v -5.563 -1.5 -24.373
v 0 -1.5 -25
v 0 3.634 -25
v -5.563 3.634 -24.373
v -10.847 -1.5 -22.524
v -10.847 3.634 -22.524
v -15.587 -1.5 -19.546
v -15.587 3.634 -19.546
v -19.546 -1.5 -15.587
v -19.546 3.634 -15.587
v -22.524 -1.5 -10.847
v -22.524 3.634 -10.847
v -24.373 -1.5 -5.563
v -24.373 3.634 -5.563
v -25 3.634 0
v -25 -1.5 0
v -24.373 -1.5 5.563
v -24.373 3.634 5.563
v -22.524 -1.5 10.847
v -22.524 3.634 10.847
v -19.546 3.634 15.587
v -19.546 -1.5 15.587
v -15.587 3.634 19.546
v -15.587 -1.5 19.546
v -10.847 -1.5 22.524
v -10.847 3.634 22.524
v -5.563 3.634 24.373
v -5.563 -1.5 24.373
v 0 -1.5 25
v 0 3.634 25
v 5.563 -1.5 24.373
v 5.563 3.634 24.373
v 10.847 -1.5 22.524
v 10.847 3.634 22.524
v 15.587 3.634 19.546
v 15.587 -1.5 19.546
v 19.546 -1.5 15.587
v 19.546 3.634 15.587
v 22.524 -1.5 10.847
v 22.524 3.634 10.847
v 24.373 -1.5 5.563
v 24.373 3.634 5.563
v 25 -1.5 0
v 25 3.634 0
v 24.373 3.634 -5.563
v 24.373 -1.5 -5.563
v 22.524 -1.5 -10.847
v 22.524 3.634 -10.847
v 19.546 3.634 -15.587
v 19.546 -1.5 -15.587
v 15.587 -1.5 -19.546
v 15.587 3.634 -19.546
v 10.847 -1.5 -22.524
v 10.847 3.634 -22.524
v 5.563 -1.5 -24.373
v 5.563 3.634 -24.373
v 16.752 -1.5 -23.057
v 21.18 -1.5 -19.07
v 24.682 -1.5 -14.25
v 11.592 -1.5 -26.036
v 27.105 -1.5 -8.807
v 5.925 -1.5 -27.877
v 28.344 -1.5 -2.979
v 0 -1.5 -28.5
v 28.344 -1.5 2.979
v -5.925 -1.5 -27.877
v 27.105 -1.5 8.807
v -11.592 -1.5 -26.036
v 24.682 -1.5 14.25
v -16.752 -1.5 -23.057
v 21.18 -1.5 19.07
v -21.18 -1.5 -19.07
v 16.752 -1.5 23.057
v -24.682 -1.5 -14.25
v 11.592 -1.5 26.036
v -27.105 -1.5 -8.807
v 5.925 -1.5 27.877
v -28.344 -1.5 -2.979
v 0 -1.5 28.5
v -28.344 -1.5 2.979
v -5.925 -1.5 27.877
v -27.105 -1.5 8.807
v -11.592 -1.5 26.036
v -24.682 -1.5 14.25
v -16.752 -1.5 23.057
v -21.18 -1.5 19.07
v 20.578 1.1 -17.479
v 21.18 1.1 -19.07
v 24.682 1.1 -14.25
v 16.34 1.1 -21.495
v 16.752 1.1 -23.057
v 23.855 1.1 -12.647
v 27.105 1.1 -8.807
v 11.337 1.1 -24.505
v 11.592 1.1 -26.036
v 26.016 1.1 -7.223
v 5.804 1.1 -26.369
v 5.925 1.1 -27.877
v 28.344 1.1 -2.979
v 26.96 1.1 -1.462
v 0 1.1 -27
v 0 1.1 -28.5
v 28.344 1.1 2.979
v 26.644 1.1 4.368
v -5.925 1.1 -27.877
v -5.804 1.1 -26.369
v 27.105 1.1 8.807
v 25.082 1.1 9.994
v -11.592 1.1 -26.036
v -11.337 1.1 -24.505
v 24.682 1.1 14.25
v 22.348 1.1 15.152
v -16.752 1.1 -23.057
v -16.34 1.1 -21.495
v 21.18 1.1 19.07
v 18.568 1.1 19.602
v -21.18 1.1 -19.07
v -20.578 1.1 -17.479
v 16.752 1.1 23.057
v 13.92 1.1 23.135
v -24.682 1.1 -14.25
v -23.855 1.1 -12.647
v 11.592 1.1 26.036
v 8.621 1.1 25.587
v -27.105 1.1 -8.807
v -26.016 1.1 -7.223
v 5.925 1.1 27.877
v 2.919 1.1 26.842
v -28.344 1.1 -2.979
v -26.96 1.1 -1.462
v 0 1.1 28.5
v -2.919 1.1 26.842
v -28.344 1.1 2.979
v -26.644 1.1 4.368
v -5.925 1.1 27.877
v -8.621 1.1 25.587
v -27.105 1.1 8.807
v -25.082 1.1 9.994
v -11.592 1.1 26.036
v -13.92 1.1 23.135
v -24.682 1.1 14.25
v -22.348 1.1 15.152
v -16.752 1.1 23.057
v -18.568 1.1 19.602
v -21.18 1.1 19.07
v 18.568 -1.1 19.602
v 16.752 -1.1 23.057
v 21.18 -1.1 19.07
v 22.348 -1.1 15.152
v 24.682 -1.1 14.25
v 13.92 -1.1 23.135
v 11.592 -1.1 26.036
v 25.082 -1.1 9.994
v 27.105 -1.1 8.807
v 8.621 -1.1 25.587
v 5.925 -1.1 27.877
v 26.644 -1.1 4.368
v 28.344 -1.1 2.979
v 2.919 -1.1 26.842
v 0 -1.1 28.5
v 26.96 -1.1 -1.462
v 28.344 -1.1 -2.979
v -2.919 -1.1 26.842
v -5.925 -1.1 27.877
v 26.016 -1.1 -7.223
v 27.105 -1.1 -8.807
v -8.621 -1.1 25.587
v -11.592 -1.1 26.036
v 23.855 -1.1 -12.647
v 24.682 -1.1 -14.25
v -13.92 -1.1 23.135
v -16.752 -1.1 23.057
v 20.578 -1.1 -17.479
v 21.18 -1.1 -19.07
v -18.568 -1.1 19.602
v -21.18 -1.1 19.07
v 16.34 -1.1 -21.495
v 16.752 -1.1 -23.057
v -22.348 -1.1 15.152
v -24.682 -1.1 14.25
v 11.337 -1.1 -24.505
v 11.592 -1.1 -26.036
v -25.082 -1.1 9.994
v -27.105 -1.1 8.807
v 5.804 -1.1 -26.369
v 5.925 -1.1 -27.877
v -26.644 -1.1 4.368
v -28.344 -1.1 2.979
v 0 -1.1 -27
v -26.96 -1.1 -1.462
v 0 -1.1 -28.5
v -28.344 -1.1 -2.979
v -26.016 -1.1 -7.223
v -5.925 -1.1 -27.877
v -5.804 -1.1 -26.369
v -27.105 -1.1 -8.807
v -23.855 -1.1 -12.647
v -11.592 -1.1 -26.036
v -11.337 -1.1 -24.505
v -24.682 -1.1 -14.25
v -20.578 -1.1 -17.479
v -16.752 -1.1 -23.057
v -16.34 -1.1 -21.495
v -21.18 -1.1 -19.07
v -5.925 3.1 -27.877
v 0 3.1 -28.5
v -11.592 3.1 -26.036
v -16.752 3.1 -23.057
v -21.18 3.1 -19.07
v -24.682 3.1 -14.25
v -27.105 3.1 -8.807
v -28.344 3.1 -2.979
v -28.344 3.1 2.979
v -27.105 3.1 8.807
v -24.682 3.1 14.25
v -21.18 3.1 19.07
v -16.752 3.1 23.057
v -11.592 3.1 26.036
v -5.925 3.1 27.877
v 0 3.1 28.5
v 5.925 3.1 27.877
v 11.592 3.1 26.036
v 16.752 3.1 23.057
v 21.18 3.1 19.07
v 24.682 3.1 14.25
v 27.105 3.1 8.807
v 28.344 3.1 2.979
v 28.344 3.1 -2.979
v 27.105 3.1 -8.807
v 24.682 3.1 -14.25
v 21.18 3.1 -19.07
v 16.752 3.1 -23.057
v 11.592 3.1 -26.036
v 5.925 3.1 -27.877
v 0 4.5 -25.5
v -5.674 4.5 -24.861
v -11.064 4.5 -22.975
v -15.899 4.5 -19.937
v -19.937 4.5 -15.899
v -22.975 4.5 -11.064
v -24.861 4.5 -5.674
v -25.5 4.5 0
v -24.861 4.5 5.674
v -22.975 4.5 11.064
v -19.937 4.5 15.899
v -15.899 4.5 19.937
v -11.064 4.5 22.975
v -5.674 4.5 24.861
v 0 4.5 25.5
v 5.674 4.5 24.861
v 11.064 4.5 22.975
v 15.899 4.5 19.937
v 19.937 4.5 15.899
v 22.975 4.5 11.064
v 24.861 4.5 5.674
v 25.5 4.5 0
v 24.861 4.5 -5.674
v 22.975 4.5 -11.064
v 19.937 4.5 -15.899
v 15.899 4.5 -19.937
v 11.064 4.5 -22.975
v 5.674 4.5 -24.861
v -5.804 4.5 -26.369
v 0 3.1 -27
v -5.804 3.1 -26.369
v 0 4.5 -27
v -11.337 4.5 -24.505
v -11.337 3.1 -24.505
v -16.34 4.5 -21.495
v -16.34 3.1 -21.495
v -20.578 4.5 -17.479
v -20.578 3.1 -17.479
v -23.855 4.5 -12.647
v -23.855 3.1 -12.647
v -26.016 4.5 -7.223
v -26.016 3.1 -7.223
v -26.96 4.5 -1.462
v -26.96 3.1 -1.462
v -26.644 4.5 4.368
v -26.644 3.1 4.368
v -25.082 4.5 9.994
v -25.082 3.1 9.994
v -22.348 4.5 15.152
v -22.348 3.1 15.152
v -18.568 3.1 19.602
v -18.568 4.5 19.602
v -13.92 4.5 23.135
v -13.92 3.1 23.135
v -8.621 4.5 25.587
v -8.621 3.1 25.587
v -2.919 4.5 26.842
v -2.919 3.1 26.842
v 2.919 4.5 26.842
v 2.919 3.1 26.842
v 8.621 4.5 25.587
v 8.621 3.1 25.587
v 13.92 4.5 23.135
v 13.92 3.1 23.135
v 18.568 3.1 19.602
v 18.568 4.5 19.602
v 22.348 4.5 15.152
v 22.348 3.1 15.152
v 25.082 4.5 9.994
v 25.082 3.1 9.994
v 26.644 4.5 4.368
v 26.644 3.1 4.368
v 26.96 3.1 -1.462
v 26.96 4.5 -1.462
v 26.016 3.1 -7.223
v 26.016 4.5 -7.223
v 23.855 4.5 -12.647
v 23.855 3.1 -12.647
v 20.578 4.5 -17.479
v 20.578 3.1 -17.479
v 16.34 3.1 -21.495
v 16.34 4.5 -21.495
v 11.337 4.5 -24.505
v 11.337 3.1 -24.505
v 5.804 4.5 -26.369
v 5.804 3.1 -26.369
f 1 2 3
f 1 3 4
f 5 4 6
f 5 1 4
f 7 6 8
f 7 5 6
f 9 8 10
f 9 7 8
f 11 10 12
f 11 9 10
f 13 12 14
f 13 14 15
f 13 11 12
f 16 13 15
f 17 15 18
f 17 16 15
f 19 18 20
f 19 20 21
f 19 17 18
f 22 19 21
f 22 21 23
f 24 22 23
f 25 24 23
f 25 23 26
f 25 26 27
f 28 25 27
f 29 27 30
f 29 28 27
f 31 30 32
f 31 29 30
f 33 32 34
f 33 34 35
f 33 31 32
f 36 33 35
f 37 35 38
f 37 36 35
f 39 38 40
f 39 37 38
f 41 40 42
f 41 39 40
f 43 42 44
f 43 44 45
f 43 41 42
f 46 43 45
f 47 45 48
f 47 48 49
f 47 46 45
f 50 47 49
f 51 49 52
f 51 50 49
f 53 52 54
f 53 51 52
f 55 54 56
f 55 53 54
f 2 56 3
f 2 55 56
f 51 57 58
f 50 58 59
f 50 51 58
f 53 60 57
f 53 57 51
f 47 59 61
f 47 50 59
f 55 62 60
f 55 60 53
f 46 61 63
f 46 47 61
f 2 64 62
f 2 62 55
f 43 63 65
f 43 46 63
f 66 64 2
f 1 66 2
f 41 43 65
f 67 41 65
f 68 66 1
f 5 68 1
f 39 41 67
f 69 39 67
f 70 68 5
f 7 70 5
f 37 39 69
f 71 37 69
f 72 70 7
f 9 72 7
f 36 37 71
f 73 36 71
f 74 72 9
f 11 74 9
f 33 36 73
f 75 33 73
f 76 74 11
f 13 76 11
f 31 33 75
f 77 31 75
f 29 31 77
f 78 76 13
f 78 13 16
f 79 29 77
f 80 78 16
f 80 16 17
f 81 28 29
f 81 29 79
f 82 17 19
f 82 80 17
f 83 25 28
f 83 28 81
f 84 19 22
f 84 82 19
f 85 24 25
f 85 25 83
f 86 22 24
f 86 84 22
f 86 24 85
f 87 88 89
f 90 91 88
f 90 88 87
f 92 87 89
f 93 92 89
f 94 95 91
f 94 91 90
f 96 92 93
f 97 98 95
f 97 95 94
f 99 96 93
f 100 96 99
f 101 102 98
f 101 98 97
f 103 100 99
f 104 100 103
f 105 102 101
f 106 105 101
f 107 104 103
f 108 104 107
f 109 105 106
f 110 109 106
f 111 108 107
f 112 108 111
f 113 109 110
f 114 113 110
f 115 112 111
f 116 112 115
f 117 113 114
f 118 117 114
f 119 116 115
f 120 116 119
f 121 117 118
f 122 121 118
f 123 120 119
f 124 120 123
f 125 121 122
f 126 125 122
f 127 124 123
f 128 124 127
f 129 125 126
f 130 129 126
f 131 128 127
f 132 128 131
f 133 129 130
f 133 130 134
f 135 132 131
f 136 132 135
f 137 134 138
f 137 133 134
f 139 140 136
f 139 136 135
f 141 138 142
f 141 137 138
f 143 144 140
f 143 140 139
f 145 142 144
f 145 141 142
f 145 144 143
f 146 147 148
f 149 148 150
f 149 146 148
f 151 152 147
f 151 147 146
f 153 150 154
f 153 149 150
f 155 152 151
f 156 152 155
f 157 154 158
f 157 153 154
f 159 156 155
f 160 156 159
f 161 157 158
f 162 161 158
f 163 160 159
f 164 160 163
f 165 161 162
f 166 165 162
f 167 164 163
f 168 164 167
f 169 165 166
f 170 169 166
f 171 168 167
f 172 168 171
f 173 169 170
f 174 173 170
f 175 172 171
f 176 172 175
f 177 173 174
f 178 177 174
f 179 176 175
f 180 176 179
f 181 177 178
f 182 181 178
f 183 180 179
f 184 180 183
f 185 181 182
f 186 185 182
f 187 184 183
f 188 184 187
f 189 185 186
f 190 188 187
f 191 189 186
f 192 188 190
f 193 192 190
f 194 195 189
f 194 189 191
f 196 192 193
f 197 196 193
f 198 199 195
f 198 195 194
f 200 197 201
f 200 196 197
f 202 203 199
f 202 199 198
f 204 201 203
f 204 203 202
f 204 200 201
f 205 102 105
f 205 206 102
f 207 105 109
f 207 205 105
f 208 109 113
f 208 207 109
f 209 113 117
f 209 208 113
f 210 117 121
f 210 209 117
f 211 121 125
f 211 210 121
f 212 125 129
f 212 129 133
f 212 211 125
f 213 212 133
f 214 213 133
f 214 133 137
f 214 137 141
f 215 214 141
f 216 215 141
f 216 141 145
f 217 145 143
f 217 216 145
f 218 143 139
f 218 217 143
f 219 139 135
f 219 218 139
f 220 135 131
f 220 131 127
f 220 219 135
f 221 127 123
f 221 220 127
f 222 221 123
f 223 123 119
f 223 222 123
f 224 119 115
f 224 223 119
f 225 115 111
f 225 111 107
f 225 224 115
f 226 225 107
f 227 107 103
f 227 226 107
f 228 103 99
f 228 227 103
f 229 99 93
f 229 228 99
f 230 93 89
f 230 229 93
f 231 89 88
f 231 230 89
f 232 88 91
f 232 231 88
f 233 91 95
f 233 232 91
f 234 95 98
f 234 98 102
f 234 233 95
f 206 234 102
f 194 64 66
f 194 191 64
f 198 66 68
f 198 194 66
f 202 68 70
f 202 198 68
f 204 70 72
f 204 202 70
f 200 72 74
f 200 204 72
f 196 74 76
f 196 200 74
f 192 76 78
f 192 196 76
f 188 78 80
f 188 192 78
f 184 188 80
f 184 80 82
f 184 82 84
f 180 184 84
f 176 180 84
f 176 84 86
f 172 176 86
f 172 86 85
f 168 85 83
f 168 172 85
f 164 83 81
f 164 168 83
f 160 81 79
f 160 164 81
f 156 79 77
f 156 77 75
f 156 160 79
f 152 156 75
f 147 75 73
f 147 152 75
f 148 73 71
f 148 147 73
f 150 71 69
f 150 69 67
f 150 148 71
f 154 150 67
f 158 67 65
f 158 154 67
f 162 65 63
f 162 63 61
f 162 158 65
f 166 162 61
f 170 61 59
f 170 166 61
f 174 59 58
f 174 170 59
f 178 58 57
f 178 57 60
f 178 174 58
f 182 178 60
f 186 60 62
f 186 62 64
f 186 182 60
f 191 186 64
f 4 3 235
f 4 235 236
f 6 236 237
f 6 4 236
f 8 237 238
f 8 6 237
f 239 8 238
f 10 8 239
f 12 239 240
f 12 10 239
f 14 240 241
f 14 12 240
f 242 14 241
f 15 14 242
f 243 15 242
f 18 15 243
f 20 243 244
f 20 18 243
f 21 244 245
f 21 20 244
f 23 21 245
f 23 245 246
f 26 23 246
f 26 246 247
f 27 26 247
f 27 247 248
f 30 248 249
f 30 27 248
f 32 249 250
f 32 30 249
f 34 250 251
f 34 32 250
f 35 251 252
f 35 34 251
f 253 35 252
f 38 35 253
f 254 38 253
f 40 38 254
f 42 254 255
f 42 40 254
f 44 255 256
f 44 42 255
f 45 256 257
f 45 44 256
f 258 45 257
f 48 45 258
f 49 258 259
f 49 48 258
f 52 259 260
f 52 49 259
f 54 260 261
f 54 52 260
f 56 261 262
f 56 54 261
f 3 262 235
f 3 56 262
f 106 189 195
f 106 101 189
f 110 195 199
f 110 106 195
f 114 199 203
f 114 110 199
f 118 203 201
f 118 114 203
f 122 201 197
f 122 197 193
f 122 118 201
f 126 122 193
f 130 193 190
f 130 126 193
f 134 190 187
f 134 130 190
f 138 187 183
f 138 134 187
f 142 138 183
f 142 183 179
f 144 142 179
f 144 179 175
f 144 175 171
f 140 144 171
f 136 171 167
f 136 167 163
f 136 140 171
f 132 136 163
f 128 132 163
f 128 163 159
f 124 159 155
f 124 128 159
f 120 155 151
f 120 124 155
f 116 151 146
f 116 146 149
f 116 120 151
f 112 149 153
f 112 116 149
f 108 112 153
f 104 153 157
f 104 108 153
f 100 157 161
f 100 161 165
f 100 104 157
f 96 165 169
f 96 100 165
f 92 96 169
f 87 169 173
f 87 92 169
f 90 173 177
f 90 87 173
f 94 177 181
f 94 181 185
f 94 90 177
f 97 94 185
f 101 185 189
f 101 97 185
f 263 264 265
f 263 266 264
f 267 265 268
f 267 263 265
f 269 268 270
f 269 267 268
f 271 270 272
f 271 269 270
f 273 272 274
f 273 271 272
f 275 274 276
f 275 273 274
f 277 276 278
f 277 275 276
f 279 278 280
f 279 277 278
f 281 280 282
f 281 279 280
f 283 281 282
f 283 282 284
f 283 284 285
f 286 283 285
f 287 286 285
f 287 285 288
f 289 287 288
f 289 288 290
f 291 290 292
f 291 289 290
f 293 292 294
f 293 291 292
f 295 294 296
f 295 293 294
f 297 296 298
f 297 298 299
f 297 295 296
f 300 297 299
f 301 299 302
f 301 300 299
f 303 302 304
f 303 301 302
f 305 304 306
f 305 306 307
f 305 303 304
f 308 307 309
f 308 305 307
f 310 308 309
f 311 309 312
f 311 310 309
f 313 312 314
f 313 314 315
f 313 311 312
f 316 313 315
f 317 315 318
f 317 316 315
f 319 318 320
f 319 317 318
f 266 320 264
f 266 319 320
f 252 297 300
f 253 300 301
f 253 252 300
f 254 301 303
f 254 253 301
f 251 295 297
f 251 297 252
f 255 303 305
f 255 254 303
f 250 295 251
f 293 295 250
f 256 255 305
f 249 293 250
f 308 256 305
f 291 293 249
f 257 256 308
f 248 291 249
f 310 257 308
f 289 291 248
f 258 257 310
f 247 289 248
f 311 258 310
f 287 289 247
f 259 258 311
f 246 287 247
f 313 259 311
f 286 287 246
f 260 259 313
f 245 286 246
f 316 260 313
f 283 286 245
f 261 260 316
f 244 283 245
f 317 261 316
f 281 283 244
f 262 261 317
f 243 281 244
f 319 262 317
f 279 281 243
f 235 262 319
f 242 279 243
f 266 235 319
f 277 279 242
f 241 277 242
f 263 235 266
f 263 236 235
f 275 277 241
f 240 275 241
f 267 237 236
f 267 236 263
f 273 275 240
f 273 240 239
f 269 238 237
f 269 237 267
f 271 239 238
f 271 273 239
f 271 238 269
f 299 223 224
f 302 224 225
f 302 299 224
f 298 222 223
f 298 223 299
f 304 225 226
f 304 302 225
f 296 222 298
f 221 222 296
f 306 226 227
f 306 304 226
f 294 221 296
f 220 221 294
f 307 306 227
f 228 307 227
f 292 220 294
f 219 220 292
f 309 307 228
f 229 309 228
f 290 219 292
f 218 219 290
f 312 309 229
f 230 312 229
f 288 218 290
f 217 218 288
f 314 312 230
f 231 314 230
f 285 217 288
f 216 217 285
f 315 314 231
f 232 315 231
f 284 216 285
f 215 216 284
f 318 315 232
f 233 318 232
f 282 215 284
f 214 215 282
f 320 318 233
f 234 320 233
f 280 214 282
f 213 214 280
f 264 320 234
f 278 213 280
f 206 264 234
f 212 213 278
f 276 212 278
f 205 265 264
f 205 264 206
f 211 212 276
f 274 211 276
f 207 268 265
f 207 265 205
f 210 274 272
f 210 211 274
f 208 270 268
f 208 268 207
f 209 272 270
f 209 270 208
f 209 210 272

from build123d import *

# Parameters (mm, degrees)
CHAMFER1_SIZE  = 0.5
CHAMFER1_SIZE2 = 0.866025404


with BuildPart() as part:
    # Sketch2 → Revolve1 (revolve)
    with BuildSketch(Plane(origin=(0, 0, 0), x_dir=(0, 0, -1), z_dir=(1, 0, 0))):
        Polygon((27, 0), (27, 1.1), (28.5, 1.1), (28.5, 3.1), (27, 3.1), (27, 4.5), (25, 4.5), (25, -1.5), (28.5, -1.5), (28.5, -1.1), (27, -1.1), align=None)
    revolve(axis=Axis((0, 0, 0), (0, 1, 0)))

    # Chamfer1
    chamfer1_edges = [part.edges().sort_by_distance(p)[0] for p in [
        (0, 4.5, 25),
    ]]
    chamfer1_side = [part.faces().sort_by_distance(p)[0] for p in [
        (0, 4.5, 26.236324676),
    ]]
    chamfer(chamfer1_edges, length=CHAMFER1_SIZE, length2=CHAMFER1_SIZE2, reference=chamfer1_side[0])


solid = part.part
